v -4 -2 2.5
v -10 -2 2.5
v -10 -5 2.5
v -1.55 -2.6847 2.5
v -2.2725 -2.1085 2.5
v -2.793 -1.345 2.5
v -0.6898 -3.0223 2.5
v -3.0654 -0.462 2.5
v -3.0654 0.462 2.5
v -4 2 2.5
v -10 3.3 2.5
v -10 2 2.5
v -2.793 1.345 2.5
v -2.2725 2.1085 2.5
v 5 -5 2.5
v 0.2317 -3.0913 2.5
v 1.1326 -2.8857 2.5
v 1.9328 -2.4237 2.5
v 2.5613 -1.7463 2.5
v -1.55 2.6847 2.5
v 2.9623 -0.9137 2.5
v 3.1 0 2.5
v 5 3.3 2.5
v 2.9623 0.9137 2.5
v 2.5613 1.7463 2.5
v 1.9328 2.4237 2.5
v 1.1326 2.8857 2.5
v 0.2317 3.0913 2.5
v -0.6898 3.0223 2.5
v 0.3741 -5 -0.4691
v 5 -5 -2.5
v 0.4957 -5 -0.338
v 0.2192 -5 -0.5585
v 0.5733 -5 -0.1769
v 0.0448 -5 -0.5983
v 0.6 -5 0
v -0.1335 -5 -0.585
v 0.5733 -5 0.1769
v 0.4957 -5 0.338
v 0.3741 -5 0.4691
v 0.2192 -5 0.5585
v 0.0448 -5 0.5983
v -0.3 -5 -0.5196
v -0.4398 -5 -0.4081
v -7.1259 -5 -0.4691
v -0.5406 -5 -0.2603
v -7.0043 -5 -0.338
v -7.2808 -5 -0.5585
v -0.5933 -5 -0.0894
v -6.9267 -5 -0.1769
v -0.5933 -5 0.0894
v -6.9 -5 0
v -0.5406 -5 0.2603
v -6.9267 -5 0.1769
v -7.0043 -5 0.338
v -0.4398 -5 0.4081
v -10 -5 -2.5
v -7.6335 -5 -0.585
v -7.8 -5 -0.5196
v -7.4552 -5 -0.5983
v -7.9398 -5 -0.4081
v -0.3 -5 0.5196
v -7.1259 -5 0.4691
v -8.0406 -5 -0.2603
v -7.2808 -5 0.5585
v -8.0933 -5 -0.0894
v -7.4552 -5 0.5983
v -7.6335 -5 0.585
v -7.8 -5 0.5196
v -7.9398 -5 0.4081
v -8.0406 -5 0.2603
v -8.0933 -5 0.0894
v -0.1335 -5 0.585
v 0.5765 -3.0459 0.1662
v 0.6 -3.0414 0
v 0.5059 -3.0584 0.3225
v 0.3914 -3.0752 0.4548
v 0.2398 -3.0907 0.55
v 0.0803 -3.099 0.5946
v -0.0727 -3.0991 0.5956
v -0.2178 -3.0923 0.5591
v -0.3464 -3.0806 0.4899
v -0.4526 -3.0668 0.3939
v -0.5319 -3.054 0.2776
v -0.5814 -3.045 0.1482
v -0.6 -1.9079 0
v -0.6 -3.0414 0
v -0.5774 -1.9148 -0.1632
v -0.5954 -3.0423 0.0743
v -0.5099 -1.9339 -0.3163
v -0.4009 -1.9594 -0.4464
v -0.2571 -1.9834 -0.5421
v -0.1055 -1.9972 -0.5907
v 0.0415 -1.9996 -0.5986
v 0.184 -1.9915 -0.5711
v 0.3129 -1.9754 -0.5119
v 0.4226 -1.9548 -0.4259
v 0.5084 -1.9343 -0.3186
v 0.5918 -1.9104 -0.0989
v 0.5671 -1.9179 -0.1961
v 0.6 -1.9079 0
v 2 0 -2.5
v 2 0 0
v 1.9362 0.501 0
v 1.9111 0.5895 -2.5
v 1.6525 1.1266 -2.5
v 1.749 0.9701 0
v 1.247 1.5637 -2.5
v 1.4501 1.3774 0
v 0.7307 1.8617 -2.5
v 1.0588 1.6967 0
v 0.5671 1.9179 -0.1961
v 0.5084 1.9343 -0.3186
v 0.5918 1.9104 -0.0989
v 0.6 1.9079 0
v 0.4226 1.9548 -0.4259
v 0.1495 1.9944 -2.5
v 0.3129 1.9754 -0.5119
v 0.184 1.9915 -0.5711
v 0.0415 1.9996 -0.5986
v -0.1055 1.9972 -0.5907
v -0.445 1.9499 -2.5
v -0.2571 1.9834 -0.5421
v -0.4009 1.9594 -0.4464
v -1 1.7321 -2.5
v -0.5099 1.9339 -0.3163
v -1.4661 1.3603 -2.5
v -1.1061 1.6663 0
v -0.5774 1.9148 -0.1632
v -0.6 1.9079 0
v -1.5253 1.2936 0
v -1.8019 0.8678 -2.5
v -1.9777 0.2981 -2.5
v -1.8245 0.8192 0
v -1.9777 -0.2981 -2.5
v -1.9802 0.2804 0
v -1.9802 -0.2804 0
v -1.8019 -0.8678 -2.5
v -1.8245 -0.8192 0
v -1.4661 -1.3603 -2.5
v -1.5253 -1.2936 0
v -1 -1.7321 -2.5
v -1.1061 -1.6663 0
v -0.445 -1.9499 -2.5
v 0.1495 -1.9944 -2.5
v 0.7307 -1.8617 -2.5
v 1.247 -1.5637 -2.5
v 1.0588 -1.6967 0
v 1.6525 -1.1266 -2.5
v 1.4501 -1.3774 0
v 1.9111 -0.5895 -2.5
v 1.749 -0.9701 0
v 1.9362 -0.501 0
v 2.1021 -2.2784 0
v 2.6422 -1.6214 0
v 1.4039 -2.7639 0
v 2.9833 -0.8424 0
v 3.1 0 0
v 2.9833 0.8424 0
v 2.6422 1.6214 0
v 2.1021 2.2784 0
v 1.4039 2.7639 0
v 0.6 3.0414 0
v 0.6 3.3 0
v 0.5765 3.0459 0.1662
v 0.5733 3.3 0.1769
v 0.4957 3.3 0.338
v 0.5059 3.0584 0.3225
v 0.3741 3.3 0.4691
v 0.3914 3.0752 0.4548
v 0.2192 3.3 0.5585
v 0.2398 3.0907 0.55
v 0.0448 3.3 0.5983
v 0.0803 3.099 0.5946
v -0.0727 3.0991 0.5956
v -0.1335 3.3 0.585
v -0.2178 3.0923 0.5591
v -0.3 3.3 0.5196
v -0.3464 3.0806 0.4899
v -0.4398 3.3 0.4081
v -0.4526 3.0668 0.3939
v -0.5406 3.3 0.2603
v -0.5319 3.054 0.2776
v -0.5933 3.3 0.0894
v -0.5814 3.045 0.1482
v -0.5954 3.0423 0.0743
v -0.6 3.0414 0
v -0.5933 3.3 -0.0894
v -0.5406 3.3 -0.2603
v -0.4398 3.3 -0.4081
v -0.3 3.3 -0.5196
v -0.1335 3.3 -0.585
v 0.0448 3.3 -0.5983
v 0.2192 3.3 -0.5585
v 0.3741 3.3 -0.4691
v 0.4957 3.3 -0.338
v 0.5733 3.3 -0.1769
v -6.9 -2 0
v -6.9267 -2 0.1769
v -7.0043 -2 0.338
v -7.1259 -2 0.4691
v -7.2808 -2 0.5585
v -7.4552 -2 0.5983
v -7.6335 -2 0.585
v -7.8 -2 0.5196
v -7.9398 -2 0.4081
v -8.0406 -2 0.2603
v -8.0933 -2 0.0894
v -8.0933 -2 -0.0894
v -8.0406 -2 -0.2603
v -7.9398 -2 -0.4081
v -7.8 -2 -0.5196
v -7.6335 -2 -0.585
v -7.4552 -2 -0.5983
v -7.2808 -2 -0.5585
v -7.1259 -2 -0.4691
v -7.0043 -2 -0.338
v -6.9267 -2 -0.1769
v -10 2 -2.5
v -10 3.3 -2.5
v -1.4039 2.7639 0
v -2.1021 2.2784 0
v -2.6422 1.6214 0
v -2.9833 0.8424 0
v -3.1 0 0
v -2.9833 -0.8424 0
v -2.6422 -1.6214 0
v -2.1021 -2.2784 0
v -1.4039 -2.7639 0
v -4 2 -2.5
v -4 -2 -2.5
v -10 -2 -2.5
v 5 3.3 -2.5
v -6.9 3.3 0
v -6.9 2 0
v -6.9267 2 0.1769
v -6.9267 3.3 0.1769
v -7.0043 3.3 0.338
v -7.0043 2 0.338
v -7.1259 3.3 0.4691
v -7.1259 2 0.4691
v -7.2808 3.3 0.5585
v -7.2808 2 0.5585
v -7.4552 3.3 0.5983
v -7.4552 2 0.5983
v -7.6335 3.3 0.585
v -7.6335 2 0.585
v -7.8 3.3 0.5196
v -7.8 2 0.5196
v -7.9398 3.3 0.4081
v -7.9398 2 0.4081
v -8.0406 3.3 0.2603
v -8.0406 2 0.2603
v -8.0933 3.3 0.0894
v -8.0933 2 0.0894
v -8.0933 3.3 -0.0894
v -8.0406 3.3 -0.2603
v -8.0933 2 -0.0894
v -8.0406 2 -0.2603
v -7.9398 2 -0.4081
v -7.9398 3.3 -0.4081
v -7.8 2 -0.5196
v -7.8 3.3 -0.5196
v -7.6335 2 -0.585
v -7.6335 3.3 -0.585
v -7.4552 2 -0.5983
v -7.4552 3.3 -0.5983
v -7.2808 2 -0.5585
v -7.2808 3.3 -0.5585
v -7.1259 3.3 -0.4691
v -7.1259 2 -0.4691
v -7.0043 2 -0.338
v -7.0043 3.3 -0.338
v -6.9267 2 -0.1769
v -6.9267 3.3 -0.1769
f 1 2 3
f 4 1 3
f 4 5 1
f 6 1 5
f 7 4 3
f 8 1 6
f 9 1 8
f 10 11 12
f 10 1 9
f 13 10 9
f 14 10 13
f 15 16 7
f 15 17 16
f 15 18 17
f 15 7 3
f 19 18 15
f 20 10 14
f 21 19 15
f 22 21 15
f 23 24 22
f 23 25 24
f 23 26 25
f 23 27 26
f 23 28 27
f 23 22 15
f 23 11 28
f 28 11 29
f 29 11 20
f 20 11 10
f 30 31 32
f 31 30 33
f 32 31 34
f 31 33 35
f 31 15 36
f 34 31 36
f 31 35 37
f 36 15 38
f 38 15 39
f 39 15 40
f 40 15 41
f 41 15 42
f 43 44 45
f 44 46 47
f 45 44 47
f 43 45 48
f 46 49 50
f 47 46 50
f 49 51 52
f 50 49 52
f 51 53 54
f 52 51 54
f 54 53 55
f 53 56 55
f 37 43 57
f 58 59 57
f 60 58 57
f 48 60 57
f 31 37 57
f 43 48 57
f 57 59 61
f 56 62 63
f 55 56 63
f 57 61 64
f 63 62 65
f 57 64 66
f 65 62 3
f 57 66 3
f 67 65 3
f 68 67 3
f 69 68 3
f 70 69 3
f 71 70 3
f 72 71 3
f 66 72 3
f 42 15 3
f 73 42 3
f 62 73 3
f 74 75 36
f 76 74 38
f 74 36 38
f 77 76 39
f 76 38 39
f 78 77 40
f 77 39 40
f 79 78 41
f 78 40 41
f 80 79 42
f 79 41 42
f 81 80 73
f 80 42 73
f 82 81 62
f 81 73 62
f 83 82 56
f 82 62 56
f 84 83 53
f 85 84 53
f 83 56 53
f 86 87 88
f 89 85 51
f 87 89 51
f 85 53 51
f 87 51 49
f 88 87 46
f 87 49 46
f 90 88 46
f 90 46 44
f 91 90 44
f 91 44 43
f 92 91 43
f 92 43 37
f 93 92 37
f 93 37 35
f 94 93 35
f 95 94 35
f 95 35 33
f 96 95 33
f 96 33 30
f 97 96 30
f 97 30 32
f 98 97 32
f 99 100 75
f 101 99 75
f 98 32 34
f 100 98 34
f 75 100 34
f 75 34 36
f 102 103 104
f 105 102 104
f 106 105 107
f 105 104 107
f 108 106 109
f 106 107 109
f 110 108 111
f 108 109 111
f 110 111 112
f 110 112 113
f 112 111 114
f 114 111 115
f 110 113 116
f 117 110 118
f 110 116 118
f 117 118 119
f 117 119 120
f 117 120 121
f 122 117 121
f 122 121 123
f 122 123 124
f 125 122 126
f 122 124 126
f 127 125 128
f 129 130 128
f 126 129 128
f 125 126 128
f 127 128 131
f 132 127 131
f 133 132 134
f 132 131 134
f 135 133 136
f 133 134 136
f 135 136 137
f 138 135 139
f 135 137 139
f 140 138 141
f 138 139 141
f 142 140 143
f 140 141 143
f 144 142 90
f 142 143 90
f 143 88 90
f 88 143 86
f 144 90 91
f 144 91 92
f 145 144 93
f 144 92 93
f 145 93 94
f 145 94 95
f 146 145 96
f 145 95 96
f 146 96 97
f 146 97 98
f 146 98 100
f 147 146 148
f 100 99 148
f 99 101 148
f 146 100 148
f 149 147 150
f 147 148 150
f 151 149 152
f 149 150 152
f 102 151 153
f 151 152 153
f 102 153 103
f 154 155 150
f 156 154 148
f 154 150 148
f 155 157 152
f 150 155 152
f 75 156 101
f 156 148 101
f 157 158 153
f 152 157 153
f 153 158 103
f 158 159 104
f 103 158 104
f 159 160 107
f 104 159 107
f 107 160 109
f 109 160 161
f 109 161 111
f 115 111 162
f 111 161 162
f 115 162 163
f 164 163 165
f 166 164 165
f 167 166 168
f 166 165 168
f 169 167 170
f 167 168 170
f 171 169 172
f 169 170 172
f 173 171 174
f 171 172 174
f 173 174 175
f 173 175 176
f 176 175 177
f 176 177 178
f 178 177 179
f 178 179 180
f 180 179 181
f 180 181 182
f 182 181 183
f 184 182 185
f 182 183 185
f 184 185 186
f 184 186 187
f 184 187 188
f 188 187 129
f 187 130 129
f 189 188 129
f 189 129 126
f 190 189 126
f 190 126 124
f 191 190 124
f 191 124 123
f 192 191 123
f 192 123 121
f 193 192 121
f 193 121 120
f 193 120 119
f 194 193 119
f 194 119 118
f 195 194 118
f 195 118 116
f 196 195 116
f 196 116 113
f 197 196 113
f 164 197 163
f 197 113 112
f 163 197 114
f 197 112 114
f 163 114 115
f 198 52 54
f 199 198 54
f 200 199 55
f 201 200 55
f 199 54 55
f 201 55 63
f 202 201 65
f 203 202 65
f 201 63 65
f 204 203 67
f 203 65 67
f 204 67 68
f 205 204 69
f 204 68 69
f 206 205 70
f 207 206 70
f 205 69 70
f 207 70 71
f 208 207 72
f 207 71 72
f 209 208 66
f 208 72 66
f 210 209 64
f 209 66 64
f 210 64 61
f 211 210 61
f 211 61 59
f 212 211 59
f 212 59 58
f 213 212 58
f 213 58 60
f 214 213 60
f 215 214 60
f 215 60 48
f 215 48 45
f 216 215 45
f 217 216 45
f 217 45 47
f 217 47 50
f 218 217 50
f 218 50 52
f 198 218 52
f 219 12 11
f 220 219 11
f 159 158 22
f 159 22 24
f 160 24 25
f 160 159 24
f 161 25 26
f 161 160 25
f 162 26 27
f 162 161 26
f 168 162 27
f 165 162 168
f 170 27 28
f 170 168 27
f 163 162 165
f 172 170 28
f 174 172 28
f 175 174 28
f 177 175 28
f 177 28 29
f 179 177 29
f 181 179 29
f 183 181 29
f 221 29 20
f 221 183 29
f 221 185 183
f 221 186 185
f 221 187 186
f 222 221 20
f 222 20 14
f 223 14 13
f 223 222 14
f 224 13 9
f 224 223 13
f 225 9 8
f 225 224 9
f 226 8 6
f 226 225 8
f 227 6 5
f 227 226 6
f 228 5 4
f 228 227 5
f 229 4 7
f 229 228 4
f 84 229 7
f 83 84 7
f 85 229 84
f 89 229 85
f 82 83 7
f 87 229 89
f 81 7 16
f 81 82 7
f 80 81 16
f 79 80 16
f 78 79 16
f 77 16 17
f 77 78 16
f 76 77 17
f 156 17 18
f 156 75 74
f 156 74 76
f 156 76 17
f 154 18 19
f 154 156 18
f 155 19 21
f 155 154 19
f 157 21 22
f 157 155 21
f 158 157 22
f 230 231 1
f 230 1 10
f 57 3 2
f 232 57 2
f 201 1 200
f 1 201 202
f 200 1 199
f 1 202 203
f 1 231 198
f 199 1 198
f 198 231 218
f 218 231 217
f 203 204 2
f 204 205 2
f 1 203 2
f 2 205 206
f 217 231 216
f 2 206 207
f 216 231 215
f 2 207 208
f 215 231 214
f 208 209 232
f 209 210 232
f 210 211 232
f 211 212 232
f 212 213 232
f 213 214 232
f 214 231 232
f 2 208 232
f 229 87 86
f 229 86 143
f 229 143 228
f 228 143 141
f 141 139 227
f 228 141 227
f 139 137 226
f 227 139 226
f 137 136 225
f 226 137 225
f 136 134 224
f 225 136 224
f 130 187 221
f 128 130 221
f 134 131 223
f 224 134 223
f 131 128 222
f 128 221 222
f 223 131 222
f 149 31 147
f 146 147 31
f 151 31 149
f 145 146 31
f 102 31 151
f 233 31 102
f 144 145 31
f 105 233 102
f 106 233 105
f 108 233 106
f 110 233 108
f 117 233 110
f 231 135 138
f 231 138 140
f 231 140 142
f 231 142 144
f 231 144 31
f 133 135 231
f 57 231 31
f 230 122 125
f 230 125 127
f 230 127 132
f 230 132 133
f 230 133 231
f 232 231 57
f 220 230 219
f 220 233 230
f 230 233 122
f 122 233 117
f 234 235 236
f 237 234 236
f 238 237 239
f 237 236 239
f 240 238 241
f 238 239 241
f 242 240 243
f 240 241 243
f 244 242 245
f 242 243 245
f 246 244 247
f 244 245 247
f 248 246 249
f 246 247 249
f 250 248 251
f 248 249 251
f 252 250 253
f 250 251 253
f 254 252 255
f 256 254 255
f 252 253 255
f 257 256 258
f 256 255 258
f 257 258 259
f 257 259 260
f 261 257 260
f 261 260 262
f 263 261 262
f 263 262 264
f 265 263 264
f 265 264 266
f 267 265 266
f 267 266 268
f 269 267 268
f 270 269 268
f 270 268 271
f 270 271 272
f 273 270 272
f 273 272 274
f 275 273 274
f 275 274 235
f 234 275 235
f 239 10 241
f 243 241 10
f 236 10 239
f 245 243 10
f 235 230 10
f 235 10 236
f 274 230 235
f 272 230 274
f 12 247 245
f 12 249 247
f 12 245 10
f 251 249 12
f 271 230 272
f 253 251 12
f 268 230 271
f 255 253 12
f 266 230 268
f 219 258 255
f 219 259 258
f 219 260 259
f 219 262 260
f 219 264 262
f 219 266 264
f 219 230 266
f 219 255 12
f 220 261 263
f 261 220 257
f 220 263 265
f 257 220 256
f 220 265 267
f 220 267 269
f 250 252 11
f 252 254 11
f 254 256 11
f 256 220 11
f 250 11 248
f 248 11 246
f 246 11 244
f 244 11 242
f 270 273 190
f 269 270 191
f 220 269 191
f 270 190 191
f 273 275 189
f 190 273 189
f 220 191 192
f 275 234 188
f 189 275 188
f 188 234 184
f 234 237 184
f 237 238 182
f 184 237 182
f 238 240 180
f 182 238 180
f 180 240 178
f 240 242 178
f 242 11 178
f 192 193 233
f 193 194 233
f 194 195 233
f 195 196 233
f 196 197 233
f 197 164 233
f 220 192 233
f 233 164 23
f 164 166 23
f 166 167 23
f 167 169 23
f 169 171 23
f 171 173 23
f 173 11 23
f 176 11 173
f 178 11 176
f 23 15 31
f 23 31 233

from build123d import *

# Parameters (mm, degrees)
SKETCH_1_W          = 20
SKETCH_1_H          = 10
SKETCH_1_R          = 3.1
EXTRUDE_1_DEPTH     = 2.5
SKETCH_2_W          = 20
SKETCH_2_H          = 10
EXTRUDE_2_DEPTH     = 2.5
SKETCH_3_R          = 0.6
CUT_EXTRUDE_1_DEPTH = 15.361406616
SKETCH_4_W          = 6
SKETCH_4_H          = 4
CUT_EXTRUDE_2_DEPTH = 13.247448796
SKETCH_5_R          = 2
CUT_EXTRUDE_3_DEPTH = 13.247448755
SKETCH_6_W          = 20
SKETCH_6_H          = 1.7
CUT_EXTRUDE_4_DEPTH = 13.247448796
SKETCH_7_W          = 5
SKETCH_7_H          = 8.3
CUT_EXTRUDE_5_DEPTH = 13.247448796


with BuildPart() as part:
    # 草图1 → 凸台-拉伸1 (new body)
    with BuildSketch(Plane.XY):
        Rectangle(SKETCH_1_W, SKETCH_1_H)
        Circle(SKETCH_1_R, mode=Mode.SUBTRACT)
    extrude(amount=EXTRUDE_1_DEPTH)

    # 草图2 → 凸台-拉伸2 (add)
    with BuildSketch(Plane(origin=(0, 0, 0), x_dir=(-1, 0, 0), z_dir=(0, 0, -1))):
        Rectangle(SKETCH_2_W, SKETCH_2_H)
    extrude(amount=EXTRUDE_2_DEPTH)

    # 草图3 → 切除-拉伸1 (cut, through all)
    with BuildSketch(Plane.XZ.offset(5)):
        with Locations((-7.5, 0)):
            Circle(SKETCH_3_R)
        Circle(SKETCH_3_R)
    extrude(amount=-CUT_EXTRUDE_1_DEPTH, mode=Mode.SUBTRACT)

    # 草图4 → 切除-拉伸2 (cut, through all)
    with BuildSketch(Plane(origin=(0, 0, -2.5), x_dir=(-1, 0, 0), z_dir=(0, 0, -1))):
        with Locations((7, 0)):
            Rectangle(SKETCH_4_W, SKETCH_4_H)
    extrude(amount=-CUT_EXTRUDE_2_DEPTH, mode=Mode.SUBTRACT)

    # 草图5 → 切除-拉伸3 (cut, through all)
    with BuildSketch(Plane.XY.offset(2.5)):
        Circle(SKETCH_5_R)
    extrude(amount=-CUT_EXTRUDE_3_DEPTH, mode=Mode.SUBTRACT)

    # 草图6 → 切除-拉伸4 (cut, through all)
    with BuildSketch(Plane.XY.offset(2.5)):
        with Locations((0, 4.15)):
            Rectangle(SKETCH_6_W, SKETCH_6_H)
    extrude(amount=-CUT_EXTRUDE_4_DEPTH, mode=Mode.SUBTRACT)

    # 草图7 → 切除-拉伸5 (cut, through all)
    with BuildSketch(Plane.XY.offset(2.5)):
        with Locations((7.5, -0.85)):
            Rectangle(SKETCH_7_W, SKETCH_7_H)
    extrude(amount=-CUT_EXTRUDE_5_DEPTH, mode=Mode.SUBTRACT)


solid = part.part
